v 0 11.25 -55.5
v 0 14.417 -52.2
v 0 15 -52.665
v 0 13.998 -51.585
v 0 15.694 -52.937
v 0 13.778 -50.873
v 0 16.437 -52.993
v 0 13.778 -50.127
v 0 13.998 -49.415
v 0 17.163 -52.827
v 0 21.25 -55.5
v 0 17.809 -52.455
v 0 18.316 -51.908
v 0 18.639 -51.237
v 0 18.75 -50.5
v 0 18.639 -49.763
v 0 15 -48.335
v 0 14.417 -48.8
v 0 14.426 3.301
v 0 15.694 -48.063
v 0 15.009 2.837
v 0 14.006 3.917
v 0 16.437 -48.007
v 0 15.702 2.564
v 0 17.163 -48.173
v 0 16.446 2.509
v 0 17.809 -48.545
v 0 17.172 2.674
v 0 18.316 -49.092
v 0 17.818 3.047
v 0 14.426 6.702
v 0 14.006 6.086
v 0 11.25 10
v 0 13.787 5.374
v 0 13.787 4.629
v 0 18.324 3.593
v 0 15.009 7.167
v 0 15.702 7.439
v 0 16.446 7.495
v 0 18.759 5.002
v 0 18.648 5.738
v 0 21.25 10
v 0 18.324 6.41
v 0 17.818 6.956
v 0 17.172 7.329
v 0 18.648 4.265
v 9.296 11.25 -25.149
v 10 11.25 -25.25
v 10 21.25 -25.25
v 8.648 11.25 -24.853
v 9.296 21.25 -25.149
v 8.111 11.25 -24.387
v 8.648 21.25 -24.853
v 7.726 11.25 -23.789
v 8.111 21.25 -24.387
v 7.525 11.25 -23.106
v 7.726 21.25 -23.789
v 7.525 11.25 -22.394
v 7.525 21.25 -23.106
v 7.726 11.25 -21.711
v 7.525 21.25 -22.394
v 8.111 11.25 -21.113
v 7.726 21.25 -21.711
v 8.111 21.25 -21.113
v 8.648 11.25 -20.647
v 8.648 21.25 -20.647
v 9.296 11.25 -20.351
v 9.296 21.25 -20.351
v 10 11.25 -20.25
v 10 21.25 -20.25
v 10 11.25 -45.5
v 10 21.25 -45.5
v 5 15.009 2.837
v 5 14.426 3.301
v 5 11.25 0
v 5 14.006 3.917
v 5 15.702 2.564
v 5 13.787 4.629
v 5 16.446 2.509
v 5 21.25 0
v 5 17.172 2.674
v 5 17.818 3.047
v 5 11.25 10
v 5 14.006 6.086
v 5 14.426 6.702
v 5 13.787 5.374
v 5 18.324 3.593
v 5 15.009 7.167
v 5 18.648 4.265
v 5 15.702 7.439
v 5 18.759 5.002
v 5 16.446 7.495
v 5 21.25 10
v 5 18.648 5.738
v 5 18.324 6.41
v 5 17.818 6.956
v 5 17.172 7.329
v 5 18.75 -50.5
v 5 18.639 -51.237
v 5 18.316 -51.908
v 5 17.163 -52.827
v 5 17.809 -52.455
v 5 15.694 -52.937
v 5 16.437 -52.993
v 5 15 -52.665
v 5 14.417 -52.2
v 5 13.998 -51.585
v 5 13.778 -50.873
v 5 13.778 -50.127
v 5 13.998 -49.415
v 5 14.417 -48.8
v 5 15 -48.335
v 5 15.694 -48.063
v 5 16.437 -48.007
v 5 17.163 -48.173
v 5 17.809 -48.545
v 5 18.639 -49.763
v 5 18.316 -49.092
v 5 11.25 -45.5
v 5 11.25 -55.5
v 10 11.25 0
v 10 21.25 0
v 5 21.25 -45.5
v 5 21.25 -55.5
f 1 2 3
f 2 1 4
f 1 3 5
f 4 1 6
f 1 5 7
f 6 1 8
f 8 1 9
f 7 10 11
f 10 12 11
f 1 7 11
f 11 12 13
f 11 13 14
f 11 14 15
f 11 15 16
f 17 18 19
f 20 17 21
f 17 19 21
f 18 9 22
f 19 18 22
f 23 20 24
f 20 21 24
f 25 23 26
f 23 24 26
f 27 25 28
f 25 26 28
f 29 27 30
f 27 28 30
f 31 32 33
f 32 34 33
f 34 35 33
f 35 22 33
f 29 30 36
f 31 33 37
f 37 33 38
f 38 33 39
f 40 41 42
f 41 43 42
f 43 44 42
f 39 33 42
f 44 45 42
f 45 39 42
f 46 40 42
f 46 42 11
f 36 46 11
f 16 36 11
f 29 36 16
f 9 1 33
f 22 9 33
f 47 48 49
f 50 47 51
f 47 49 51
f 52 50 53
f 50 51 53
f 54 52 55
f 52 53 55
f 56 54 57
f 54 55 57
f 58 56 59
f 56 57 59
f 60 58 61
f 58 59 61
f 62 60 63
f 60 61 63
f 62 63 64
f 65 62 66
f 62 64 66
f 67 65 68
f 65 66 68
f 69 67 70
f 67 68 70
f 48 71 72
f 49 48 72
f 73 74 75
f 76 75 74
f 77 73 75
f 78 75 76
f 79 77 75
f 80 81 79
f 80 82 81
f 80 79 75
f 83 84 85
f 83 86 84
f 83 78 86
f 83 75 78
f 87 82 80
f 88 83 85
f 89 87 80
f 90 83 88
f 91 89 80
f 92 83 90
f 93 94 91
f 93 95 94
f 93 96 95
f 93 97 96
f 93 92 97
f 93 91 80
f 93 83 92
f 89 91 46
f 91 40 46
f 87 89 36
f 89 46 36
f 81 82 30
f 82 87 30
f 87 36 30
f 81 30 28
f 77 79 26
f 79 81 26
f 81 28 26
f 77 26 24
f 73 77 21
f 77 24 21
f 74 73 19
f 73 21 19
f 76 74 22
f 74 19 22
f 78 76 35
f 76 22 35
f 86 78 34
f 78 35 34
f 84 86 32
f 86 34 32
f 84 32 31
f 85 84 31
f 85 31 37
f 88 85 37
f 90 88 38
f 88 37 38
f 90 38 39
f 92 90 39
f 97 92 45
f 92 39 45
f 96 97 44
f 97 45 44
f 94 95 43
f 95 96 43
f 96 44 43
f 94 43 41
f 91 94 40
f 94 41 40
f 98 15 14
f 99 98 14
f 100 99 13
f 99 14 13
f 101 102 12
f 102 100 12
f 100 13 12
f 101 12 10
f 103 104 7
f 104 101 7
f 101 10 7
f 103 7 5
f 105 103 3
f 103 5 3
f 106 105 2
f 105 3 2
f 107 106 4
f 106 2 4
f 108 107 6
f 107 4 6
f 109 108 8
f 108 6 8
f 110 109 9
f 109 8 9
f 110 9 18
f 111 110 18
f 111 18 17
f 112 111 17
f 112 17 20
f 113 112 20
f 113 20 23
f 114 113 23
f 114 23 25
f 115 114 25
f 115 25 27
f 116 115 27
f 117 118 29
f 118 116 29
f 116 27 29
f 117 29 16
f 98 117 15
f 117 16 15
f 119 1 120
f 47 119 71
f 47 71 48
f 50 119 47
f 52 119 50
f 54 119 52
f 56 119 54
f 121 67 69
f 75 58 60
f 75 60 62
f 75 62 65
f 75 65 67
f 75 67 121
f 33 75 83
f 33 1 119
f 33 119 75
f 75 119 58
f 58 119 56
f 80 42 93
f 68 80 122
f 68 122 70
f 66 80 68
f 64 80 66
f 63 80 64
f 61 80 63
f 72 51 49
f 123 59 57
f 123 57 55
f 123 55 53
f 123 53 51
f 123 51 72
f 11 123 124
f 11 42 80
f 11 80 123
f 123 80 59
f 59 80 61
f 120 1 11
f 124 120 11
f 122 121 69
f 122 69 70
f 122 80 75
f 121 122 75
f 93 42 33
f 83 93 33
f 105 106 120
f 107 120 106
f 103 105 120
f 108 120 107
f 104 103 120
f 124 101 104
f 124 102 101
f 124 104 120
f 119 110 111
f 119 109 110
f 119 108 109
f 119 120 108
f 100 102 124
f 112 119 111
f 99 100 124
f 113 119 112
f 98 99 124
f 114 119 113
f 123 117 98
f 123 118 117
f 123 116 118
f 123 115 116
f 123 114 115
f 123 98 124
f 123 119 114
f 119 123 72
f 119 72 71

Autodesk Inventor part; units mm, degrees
ref_plane "YZ Plane" through (0, 0, 0) normal (1, 0, 0) x (0, 1, 0)
ref_plane "XZ Plane" through (0, 0, 0) normal (0, 1, 0) x (-1, 0, 0)
ref_plane "XY Plane" through (0, 0, 0) normal (0, 0, 1) x (1, 0, 0)
sketch "Sketch1" plane through (0, 0, 0) normal (1, 0, 0) x (0, 1, 0)
  line L0 (-6, -12.5) -> (-6, -12.9)
  arc A0 (-6, -12.9) -> (-5.6, -13.3) centre (-5.6, -12.9) ccw
  line L1 (-5.6, -13.3) -> (-4.9, -13.3)
  arc A1 (-4.9, -13.3) -> (-4.7, -13.1) centre (-4.9, -13.1) ccw
  line L2 (-4.7, -13.1) -> (-4.7, -12.85)
  arc A2 (-4.5, -12.65) -> (-4.7, -12.85) centre (-4.5, -12.85) ccw
  line L3 (-4.5, -12.65) -> (-1.8, -12.65)
  arc A3 (-1.4, -13.05) -> (-1.8, -12.65) centre (-1.8, -13.05) ccw
  line L4 (-1.4, -13.05) -> (-1.4, -18.75)
  line L5 (-1.8, -19.15) -> (-4.5, -19.15)
  arc A4 (-1.8, -19.15) -> (-1.4, -18.75) centre (-1.8, -18.75) ccw
  arc A5 (-4.7, -18.95) -> (-4.5, -19.15) centre (-4.5, -18.95) ccw
  line L6 (-4.7, -18.95) -> (-4.7, -18.7)
  arc A6 (-4.7, -18.7) -> (-4.9, -18.5) centre (-4.9, -18.7) ccw
  line L7 (-4.9, -18.5) -> (-5.6, -18.5)
  arc A7 (-5.6, -18.5) -> (-6, -18.9) centre (-5.6, -18.9) ccw
  line L8 (-6, -18.9) -> (-6, -19.5)
  line L9 (-6.5, -6.5) -> (-6.5, -12.5)
  line L10 (-6.5, -12.5) -> (-2.5, -12.5)
  line L11 (-1.05, -19.5) -> (-6.5, -19.5)
  line L12 (-6.5, -19.5) -> (-6.5, -26)
  line L13 (-6.5, -26) -> (-1.05, -26)
  line L14 (-6, -26) -> (-6, -26.6)
  arc A8 (-6, -26.6) -> (-5.6, -27) centre (-5.6, -26.6) ccw
  line L15 (-5.6, -27) -> (-4.9, -27)
  arc A9 (-4.9, -27) -> (-4.7, -26.8) centre (-4.9, -26.8) ccw
  arc A10 (-4.5, -26.35) -> (-4.7, -26.55) centre (-4.5, -26.55) ccw
  line L16 (-4.7, -26.8) -> (-4.7, -26.55)
  line L17 (-4.5, -26.35) -> (-1.8, -26.35)
  arc A11 (-1.4, -26.75) -> (-1.8, -26.35) centre (-1.8, -26.75) ccw
  line L18 (-1.4, -26.75) -> (-1.4, -32.45)
  arc A12 (-1.8, -32.85) -> (-1.4, -32.45) centre (-1.8, -32.45) ccw
  line L19 (-1.8, -32.85) -> (-4.5, -32.85)
  arc A13 (-4.7, -32.65) -> (-4.5, -32.85) centre (-4.5, -32.65) ccw
  line L20 (-4.7, -32.65) -> (-4.7, -32.4)
  arc A14 (-4.7, -32.4) -> (-4.9, -32.2) centre (-4.9, -32.4) ccw
  line L21 (-4.9, -32.2) -> (-5.6, -32.2)
  arc A15 (-5.6, -32.2) -> (-6, -32.6) centre (-5.6, -32.6) ccw
  line L22 (-6, -32.6) -> (-6, -33)
  line L23 (-2.5, -33) -> (-6.5, -33)
  line L24 (-6.5, -33) -> (-6.5, -39)
  line L25 (32.5, 0) -> (0, 0)
  circle A16 centre (0, -6.5) radius 4.75
  circle A17 centre (32.5, -6.5) radius 4.75
  circle A18 centre (0, -39) radius 4.75
  circle A19 centre (32.5, -39) radius 4.75
  line L26 (39, -26) -> (39, -19.5)
  line L27 (39, -12.5) -> (39, -6.5)
  line L28 (39, -39) -> (39, -33)
  line L29 (26.5, -45.5) -> (32.5, -45.5)
  line L30 (0, -45.5) -> (6, -45.5)
  line L31 (13, -45.5) -> (19.5, -45.5)
  circle A20 centre (16.25, -22.75) radius 15
  circle A21 centre (16.2588, 5.0016) radius 2.5
  circle A22 centre (16.25, -50.5) radius 2.5
  circle A23 centre (16.25, -22.75) radius 5
  circle A24 centre (16.25, -22.75) radius 8.45
  line L32 (24.75, -27.6575) -> (24.75, -17.8425)
  line L33 (44, 10) -> (-11.5, 10)
  line L34 (-11.5, 10) -> (-11.5, -55.5)
  line L35 (-11.5, -55.5) -> (44, -55.5)
  line L36 (44, -55.5) -> (44, 10)
  line L37 (-11.5, 30) -> (44, 30)
  line L38 (-11.5, -75.5) -> (-11.5, 30)
  line L39 (44, 30) -> (44, -75.5)
  line L40 (44, -75.5) -> (-11.5, -75.5)
  circle A25 centre (16.25, -65.5) radius 5
  circle A26 centre (16.25, 20) radius 5
  arc A27 (11.25, -55.5) -> (21.25, -55.5) centre (16.25, -55.5) ccw
  line L41 (21.25, 10) -> (21.25, -55.5)
  line L42 (11.25, -55.5) -> (11.25, 10)
  arc A28 (21.25, 10) -> (11.25, 10) centre (16.25, 10) ccw
  line L43 (21.25, -45.5) -> (11.25, -45.5)
  point P0 (21.25, 0)
  point P1 (11.25, 0)
extrude "Extrusion1" add sketch "Sketch1" along normal blind 10 contours L41 A20 L42 L25 | L41 A24 L42 A20 | L41 A23 L42 A24 | L42 A24 L41 A20 | A20 L41 L43 L31 L42 | A23 | L41 A24 L42 A23
extrude "Extrusion2" add sketch "Sketch1" along normal blind 5 contours L25 L42 L33 L41 | L43 L31 L41 L35 L42
sketch "Sketch4" plane through (10, 21.25, 0) normal (0, 1, 0) x (1, 0, 0)
  line L0 (0, 45.5) -> (0, 0) projected
  circle A0 centre (0, 22.75) radius 2.5
  point P0 (-10, 0)
  dimension "d7" = 5
extrude "Extrusion4" cut sketch "Sketch4" against normal blind 10
properties part number "Cuchilla"
